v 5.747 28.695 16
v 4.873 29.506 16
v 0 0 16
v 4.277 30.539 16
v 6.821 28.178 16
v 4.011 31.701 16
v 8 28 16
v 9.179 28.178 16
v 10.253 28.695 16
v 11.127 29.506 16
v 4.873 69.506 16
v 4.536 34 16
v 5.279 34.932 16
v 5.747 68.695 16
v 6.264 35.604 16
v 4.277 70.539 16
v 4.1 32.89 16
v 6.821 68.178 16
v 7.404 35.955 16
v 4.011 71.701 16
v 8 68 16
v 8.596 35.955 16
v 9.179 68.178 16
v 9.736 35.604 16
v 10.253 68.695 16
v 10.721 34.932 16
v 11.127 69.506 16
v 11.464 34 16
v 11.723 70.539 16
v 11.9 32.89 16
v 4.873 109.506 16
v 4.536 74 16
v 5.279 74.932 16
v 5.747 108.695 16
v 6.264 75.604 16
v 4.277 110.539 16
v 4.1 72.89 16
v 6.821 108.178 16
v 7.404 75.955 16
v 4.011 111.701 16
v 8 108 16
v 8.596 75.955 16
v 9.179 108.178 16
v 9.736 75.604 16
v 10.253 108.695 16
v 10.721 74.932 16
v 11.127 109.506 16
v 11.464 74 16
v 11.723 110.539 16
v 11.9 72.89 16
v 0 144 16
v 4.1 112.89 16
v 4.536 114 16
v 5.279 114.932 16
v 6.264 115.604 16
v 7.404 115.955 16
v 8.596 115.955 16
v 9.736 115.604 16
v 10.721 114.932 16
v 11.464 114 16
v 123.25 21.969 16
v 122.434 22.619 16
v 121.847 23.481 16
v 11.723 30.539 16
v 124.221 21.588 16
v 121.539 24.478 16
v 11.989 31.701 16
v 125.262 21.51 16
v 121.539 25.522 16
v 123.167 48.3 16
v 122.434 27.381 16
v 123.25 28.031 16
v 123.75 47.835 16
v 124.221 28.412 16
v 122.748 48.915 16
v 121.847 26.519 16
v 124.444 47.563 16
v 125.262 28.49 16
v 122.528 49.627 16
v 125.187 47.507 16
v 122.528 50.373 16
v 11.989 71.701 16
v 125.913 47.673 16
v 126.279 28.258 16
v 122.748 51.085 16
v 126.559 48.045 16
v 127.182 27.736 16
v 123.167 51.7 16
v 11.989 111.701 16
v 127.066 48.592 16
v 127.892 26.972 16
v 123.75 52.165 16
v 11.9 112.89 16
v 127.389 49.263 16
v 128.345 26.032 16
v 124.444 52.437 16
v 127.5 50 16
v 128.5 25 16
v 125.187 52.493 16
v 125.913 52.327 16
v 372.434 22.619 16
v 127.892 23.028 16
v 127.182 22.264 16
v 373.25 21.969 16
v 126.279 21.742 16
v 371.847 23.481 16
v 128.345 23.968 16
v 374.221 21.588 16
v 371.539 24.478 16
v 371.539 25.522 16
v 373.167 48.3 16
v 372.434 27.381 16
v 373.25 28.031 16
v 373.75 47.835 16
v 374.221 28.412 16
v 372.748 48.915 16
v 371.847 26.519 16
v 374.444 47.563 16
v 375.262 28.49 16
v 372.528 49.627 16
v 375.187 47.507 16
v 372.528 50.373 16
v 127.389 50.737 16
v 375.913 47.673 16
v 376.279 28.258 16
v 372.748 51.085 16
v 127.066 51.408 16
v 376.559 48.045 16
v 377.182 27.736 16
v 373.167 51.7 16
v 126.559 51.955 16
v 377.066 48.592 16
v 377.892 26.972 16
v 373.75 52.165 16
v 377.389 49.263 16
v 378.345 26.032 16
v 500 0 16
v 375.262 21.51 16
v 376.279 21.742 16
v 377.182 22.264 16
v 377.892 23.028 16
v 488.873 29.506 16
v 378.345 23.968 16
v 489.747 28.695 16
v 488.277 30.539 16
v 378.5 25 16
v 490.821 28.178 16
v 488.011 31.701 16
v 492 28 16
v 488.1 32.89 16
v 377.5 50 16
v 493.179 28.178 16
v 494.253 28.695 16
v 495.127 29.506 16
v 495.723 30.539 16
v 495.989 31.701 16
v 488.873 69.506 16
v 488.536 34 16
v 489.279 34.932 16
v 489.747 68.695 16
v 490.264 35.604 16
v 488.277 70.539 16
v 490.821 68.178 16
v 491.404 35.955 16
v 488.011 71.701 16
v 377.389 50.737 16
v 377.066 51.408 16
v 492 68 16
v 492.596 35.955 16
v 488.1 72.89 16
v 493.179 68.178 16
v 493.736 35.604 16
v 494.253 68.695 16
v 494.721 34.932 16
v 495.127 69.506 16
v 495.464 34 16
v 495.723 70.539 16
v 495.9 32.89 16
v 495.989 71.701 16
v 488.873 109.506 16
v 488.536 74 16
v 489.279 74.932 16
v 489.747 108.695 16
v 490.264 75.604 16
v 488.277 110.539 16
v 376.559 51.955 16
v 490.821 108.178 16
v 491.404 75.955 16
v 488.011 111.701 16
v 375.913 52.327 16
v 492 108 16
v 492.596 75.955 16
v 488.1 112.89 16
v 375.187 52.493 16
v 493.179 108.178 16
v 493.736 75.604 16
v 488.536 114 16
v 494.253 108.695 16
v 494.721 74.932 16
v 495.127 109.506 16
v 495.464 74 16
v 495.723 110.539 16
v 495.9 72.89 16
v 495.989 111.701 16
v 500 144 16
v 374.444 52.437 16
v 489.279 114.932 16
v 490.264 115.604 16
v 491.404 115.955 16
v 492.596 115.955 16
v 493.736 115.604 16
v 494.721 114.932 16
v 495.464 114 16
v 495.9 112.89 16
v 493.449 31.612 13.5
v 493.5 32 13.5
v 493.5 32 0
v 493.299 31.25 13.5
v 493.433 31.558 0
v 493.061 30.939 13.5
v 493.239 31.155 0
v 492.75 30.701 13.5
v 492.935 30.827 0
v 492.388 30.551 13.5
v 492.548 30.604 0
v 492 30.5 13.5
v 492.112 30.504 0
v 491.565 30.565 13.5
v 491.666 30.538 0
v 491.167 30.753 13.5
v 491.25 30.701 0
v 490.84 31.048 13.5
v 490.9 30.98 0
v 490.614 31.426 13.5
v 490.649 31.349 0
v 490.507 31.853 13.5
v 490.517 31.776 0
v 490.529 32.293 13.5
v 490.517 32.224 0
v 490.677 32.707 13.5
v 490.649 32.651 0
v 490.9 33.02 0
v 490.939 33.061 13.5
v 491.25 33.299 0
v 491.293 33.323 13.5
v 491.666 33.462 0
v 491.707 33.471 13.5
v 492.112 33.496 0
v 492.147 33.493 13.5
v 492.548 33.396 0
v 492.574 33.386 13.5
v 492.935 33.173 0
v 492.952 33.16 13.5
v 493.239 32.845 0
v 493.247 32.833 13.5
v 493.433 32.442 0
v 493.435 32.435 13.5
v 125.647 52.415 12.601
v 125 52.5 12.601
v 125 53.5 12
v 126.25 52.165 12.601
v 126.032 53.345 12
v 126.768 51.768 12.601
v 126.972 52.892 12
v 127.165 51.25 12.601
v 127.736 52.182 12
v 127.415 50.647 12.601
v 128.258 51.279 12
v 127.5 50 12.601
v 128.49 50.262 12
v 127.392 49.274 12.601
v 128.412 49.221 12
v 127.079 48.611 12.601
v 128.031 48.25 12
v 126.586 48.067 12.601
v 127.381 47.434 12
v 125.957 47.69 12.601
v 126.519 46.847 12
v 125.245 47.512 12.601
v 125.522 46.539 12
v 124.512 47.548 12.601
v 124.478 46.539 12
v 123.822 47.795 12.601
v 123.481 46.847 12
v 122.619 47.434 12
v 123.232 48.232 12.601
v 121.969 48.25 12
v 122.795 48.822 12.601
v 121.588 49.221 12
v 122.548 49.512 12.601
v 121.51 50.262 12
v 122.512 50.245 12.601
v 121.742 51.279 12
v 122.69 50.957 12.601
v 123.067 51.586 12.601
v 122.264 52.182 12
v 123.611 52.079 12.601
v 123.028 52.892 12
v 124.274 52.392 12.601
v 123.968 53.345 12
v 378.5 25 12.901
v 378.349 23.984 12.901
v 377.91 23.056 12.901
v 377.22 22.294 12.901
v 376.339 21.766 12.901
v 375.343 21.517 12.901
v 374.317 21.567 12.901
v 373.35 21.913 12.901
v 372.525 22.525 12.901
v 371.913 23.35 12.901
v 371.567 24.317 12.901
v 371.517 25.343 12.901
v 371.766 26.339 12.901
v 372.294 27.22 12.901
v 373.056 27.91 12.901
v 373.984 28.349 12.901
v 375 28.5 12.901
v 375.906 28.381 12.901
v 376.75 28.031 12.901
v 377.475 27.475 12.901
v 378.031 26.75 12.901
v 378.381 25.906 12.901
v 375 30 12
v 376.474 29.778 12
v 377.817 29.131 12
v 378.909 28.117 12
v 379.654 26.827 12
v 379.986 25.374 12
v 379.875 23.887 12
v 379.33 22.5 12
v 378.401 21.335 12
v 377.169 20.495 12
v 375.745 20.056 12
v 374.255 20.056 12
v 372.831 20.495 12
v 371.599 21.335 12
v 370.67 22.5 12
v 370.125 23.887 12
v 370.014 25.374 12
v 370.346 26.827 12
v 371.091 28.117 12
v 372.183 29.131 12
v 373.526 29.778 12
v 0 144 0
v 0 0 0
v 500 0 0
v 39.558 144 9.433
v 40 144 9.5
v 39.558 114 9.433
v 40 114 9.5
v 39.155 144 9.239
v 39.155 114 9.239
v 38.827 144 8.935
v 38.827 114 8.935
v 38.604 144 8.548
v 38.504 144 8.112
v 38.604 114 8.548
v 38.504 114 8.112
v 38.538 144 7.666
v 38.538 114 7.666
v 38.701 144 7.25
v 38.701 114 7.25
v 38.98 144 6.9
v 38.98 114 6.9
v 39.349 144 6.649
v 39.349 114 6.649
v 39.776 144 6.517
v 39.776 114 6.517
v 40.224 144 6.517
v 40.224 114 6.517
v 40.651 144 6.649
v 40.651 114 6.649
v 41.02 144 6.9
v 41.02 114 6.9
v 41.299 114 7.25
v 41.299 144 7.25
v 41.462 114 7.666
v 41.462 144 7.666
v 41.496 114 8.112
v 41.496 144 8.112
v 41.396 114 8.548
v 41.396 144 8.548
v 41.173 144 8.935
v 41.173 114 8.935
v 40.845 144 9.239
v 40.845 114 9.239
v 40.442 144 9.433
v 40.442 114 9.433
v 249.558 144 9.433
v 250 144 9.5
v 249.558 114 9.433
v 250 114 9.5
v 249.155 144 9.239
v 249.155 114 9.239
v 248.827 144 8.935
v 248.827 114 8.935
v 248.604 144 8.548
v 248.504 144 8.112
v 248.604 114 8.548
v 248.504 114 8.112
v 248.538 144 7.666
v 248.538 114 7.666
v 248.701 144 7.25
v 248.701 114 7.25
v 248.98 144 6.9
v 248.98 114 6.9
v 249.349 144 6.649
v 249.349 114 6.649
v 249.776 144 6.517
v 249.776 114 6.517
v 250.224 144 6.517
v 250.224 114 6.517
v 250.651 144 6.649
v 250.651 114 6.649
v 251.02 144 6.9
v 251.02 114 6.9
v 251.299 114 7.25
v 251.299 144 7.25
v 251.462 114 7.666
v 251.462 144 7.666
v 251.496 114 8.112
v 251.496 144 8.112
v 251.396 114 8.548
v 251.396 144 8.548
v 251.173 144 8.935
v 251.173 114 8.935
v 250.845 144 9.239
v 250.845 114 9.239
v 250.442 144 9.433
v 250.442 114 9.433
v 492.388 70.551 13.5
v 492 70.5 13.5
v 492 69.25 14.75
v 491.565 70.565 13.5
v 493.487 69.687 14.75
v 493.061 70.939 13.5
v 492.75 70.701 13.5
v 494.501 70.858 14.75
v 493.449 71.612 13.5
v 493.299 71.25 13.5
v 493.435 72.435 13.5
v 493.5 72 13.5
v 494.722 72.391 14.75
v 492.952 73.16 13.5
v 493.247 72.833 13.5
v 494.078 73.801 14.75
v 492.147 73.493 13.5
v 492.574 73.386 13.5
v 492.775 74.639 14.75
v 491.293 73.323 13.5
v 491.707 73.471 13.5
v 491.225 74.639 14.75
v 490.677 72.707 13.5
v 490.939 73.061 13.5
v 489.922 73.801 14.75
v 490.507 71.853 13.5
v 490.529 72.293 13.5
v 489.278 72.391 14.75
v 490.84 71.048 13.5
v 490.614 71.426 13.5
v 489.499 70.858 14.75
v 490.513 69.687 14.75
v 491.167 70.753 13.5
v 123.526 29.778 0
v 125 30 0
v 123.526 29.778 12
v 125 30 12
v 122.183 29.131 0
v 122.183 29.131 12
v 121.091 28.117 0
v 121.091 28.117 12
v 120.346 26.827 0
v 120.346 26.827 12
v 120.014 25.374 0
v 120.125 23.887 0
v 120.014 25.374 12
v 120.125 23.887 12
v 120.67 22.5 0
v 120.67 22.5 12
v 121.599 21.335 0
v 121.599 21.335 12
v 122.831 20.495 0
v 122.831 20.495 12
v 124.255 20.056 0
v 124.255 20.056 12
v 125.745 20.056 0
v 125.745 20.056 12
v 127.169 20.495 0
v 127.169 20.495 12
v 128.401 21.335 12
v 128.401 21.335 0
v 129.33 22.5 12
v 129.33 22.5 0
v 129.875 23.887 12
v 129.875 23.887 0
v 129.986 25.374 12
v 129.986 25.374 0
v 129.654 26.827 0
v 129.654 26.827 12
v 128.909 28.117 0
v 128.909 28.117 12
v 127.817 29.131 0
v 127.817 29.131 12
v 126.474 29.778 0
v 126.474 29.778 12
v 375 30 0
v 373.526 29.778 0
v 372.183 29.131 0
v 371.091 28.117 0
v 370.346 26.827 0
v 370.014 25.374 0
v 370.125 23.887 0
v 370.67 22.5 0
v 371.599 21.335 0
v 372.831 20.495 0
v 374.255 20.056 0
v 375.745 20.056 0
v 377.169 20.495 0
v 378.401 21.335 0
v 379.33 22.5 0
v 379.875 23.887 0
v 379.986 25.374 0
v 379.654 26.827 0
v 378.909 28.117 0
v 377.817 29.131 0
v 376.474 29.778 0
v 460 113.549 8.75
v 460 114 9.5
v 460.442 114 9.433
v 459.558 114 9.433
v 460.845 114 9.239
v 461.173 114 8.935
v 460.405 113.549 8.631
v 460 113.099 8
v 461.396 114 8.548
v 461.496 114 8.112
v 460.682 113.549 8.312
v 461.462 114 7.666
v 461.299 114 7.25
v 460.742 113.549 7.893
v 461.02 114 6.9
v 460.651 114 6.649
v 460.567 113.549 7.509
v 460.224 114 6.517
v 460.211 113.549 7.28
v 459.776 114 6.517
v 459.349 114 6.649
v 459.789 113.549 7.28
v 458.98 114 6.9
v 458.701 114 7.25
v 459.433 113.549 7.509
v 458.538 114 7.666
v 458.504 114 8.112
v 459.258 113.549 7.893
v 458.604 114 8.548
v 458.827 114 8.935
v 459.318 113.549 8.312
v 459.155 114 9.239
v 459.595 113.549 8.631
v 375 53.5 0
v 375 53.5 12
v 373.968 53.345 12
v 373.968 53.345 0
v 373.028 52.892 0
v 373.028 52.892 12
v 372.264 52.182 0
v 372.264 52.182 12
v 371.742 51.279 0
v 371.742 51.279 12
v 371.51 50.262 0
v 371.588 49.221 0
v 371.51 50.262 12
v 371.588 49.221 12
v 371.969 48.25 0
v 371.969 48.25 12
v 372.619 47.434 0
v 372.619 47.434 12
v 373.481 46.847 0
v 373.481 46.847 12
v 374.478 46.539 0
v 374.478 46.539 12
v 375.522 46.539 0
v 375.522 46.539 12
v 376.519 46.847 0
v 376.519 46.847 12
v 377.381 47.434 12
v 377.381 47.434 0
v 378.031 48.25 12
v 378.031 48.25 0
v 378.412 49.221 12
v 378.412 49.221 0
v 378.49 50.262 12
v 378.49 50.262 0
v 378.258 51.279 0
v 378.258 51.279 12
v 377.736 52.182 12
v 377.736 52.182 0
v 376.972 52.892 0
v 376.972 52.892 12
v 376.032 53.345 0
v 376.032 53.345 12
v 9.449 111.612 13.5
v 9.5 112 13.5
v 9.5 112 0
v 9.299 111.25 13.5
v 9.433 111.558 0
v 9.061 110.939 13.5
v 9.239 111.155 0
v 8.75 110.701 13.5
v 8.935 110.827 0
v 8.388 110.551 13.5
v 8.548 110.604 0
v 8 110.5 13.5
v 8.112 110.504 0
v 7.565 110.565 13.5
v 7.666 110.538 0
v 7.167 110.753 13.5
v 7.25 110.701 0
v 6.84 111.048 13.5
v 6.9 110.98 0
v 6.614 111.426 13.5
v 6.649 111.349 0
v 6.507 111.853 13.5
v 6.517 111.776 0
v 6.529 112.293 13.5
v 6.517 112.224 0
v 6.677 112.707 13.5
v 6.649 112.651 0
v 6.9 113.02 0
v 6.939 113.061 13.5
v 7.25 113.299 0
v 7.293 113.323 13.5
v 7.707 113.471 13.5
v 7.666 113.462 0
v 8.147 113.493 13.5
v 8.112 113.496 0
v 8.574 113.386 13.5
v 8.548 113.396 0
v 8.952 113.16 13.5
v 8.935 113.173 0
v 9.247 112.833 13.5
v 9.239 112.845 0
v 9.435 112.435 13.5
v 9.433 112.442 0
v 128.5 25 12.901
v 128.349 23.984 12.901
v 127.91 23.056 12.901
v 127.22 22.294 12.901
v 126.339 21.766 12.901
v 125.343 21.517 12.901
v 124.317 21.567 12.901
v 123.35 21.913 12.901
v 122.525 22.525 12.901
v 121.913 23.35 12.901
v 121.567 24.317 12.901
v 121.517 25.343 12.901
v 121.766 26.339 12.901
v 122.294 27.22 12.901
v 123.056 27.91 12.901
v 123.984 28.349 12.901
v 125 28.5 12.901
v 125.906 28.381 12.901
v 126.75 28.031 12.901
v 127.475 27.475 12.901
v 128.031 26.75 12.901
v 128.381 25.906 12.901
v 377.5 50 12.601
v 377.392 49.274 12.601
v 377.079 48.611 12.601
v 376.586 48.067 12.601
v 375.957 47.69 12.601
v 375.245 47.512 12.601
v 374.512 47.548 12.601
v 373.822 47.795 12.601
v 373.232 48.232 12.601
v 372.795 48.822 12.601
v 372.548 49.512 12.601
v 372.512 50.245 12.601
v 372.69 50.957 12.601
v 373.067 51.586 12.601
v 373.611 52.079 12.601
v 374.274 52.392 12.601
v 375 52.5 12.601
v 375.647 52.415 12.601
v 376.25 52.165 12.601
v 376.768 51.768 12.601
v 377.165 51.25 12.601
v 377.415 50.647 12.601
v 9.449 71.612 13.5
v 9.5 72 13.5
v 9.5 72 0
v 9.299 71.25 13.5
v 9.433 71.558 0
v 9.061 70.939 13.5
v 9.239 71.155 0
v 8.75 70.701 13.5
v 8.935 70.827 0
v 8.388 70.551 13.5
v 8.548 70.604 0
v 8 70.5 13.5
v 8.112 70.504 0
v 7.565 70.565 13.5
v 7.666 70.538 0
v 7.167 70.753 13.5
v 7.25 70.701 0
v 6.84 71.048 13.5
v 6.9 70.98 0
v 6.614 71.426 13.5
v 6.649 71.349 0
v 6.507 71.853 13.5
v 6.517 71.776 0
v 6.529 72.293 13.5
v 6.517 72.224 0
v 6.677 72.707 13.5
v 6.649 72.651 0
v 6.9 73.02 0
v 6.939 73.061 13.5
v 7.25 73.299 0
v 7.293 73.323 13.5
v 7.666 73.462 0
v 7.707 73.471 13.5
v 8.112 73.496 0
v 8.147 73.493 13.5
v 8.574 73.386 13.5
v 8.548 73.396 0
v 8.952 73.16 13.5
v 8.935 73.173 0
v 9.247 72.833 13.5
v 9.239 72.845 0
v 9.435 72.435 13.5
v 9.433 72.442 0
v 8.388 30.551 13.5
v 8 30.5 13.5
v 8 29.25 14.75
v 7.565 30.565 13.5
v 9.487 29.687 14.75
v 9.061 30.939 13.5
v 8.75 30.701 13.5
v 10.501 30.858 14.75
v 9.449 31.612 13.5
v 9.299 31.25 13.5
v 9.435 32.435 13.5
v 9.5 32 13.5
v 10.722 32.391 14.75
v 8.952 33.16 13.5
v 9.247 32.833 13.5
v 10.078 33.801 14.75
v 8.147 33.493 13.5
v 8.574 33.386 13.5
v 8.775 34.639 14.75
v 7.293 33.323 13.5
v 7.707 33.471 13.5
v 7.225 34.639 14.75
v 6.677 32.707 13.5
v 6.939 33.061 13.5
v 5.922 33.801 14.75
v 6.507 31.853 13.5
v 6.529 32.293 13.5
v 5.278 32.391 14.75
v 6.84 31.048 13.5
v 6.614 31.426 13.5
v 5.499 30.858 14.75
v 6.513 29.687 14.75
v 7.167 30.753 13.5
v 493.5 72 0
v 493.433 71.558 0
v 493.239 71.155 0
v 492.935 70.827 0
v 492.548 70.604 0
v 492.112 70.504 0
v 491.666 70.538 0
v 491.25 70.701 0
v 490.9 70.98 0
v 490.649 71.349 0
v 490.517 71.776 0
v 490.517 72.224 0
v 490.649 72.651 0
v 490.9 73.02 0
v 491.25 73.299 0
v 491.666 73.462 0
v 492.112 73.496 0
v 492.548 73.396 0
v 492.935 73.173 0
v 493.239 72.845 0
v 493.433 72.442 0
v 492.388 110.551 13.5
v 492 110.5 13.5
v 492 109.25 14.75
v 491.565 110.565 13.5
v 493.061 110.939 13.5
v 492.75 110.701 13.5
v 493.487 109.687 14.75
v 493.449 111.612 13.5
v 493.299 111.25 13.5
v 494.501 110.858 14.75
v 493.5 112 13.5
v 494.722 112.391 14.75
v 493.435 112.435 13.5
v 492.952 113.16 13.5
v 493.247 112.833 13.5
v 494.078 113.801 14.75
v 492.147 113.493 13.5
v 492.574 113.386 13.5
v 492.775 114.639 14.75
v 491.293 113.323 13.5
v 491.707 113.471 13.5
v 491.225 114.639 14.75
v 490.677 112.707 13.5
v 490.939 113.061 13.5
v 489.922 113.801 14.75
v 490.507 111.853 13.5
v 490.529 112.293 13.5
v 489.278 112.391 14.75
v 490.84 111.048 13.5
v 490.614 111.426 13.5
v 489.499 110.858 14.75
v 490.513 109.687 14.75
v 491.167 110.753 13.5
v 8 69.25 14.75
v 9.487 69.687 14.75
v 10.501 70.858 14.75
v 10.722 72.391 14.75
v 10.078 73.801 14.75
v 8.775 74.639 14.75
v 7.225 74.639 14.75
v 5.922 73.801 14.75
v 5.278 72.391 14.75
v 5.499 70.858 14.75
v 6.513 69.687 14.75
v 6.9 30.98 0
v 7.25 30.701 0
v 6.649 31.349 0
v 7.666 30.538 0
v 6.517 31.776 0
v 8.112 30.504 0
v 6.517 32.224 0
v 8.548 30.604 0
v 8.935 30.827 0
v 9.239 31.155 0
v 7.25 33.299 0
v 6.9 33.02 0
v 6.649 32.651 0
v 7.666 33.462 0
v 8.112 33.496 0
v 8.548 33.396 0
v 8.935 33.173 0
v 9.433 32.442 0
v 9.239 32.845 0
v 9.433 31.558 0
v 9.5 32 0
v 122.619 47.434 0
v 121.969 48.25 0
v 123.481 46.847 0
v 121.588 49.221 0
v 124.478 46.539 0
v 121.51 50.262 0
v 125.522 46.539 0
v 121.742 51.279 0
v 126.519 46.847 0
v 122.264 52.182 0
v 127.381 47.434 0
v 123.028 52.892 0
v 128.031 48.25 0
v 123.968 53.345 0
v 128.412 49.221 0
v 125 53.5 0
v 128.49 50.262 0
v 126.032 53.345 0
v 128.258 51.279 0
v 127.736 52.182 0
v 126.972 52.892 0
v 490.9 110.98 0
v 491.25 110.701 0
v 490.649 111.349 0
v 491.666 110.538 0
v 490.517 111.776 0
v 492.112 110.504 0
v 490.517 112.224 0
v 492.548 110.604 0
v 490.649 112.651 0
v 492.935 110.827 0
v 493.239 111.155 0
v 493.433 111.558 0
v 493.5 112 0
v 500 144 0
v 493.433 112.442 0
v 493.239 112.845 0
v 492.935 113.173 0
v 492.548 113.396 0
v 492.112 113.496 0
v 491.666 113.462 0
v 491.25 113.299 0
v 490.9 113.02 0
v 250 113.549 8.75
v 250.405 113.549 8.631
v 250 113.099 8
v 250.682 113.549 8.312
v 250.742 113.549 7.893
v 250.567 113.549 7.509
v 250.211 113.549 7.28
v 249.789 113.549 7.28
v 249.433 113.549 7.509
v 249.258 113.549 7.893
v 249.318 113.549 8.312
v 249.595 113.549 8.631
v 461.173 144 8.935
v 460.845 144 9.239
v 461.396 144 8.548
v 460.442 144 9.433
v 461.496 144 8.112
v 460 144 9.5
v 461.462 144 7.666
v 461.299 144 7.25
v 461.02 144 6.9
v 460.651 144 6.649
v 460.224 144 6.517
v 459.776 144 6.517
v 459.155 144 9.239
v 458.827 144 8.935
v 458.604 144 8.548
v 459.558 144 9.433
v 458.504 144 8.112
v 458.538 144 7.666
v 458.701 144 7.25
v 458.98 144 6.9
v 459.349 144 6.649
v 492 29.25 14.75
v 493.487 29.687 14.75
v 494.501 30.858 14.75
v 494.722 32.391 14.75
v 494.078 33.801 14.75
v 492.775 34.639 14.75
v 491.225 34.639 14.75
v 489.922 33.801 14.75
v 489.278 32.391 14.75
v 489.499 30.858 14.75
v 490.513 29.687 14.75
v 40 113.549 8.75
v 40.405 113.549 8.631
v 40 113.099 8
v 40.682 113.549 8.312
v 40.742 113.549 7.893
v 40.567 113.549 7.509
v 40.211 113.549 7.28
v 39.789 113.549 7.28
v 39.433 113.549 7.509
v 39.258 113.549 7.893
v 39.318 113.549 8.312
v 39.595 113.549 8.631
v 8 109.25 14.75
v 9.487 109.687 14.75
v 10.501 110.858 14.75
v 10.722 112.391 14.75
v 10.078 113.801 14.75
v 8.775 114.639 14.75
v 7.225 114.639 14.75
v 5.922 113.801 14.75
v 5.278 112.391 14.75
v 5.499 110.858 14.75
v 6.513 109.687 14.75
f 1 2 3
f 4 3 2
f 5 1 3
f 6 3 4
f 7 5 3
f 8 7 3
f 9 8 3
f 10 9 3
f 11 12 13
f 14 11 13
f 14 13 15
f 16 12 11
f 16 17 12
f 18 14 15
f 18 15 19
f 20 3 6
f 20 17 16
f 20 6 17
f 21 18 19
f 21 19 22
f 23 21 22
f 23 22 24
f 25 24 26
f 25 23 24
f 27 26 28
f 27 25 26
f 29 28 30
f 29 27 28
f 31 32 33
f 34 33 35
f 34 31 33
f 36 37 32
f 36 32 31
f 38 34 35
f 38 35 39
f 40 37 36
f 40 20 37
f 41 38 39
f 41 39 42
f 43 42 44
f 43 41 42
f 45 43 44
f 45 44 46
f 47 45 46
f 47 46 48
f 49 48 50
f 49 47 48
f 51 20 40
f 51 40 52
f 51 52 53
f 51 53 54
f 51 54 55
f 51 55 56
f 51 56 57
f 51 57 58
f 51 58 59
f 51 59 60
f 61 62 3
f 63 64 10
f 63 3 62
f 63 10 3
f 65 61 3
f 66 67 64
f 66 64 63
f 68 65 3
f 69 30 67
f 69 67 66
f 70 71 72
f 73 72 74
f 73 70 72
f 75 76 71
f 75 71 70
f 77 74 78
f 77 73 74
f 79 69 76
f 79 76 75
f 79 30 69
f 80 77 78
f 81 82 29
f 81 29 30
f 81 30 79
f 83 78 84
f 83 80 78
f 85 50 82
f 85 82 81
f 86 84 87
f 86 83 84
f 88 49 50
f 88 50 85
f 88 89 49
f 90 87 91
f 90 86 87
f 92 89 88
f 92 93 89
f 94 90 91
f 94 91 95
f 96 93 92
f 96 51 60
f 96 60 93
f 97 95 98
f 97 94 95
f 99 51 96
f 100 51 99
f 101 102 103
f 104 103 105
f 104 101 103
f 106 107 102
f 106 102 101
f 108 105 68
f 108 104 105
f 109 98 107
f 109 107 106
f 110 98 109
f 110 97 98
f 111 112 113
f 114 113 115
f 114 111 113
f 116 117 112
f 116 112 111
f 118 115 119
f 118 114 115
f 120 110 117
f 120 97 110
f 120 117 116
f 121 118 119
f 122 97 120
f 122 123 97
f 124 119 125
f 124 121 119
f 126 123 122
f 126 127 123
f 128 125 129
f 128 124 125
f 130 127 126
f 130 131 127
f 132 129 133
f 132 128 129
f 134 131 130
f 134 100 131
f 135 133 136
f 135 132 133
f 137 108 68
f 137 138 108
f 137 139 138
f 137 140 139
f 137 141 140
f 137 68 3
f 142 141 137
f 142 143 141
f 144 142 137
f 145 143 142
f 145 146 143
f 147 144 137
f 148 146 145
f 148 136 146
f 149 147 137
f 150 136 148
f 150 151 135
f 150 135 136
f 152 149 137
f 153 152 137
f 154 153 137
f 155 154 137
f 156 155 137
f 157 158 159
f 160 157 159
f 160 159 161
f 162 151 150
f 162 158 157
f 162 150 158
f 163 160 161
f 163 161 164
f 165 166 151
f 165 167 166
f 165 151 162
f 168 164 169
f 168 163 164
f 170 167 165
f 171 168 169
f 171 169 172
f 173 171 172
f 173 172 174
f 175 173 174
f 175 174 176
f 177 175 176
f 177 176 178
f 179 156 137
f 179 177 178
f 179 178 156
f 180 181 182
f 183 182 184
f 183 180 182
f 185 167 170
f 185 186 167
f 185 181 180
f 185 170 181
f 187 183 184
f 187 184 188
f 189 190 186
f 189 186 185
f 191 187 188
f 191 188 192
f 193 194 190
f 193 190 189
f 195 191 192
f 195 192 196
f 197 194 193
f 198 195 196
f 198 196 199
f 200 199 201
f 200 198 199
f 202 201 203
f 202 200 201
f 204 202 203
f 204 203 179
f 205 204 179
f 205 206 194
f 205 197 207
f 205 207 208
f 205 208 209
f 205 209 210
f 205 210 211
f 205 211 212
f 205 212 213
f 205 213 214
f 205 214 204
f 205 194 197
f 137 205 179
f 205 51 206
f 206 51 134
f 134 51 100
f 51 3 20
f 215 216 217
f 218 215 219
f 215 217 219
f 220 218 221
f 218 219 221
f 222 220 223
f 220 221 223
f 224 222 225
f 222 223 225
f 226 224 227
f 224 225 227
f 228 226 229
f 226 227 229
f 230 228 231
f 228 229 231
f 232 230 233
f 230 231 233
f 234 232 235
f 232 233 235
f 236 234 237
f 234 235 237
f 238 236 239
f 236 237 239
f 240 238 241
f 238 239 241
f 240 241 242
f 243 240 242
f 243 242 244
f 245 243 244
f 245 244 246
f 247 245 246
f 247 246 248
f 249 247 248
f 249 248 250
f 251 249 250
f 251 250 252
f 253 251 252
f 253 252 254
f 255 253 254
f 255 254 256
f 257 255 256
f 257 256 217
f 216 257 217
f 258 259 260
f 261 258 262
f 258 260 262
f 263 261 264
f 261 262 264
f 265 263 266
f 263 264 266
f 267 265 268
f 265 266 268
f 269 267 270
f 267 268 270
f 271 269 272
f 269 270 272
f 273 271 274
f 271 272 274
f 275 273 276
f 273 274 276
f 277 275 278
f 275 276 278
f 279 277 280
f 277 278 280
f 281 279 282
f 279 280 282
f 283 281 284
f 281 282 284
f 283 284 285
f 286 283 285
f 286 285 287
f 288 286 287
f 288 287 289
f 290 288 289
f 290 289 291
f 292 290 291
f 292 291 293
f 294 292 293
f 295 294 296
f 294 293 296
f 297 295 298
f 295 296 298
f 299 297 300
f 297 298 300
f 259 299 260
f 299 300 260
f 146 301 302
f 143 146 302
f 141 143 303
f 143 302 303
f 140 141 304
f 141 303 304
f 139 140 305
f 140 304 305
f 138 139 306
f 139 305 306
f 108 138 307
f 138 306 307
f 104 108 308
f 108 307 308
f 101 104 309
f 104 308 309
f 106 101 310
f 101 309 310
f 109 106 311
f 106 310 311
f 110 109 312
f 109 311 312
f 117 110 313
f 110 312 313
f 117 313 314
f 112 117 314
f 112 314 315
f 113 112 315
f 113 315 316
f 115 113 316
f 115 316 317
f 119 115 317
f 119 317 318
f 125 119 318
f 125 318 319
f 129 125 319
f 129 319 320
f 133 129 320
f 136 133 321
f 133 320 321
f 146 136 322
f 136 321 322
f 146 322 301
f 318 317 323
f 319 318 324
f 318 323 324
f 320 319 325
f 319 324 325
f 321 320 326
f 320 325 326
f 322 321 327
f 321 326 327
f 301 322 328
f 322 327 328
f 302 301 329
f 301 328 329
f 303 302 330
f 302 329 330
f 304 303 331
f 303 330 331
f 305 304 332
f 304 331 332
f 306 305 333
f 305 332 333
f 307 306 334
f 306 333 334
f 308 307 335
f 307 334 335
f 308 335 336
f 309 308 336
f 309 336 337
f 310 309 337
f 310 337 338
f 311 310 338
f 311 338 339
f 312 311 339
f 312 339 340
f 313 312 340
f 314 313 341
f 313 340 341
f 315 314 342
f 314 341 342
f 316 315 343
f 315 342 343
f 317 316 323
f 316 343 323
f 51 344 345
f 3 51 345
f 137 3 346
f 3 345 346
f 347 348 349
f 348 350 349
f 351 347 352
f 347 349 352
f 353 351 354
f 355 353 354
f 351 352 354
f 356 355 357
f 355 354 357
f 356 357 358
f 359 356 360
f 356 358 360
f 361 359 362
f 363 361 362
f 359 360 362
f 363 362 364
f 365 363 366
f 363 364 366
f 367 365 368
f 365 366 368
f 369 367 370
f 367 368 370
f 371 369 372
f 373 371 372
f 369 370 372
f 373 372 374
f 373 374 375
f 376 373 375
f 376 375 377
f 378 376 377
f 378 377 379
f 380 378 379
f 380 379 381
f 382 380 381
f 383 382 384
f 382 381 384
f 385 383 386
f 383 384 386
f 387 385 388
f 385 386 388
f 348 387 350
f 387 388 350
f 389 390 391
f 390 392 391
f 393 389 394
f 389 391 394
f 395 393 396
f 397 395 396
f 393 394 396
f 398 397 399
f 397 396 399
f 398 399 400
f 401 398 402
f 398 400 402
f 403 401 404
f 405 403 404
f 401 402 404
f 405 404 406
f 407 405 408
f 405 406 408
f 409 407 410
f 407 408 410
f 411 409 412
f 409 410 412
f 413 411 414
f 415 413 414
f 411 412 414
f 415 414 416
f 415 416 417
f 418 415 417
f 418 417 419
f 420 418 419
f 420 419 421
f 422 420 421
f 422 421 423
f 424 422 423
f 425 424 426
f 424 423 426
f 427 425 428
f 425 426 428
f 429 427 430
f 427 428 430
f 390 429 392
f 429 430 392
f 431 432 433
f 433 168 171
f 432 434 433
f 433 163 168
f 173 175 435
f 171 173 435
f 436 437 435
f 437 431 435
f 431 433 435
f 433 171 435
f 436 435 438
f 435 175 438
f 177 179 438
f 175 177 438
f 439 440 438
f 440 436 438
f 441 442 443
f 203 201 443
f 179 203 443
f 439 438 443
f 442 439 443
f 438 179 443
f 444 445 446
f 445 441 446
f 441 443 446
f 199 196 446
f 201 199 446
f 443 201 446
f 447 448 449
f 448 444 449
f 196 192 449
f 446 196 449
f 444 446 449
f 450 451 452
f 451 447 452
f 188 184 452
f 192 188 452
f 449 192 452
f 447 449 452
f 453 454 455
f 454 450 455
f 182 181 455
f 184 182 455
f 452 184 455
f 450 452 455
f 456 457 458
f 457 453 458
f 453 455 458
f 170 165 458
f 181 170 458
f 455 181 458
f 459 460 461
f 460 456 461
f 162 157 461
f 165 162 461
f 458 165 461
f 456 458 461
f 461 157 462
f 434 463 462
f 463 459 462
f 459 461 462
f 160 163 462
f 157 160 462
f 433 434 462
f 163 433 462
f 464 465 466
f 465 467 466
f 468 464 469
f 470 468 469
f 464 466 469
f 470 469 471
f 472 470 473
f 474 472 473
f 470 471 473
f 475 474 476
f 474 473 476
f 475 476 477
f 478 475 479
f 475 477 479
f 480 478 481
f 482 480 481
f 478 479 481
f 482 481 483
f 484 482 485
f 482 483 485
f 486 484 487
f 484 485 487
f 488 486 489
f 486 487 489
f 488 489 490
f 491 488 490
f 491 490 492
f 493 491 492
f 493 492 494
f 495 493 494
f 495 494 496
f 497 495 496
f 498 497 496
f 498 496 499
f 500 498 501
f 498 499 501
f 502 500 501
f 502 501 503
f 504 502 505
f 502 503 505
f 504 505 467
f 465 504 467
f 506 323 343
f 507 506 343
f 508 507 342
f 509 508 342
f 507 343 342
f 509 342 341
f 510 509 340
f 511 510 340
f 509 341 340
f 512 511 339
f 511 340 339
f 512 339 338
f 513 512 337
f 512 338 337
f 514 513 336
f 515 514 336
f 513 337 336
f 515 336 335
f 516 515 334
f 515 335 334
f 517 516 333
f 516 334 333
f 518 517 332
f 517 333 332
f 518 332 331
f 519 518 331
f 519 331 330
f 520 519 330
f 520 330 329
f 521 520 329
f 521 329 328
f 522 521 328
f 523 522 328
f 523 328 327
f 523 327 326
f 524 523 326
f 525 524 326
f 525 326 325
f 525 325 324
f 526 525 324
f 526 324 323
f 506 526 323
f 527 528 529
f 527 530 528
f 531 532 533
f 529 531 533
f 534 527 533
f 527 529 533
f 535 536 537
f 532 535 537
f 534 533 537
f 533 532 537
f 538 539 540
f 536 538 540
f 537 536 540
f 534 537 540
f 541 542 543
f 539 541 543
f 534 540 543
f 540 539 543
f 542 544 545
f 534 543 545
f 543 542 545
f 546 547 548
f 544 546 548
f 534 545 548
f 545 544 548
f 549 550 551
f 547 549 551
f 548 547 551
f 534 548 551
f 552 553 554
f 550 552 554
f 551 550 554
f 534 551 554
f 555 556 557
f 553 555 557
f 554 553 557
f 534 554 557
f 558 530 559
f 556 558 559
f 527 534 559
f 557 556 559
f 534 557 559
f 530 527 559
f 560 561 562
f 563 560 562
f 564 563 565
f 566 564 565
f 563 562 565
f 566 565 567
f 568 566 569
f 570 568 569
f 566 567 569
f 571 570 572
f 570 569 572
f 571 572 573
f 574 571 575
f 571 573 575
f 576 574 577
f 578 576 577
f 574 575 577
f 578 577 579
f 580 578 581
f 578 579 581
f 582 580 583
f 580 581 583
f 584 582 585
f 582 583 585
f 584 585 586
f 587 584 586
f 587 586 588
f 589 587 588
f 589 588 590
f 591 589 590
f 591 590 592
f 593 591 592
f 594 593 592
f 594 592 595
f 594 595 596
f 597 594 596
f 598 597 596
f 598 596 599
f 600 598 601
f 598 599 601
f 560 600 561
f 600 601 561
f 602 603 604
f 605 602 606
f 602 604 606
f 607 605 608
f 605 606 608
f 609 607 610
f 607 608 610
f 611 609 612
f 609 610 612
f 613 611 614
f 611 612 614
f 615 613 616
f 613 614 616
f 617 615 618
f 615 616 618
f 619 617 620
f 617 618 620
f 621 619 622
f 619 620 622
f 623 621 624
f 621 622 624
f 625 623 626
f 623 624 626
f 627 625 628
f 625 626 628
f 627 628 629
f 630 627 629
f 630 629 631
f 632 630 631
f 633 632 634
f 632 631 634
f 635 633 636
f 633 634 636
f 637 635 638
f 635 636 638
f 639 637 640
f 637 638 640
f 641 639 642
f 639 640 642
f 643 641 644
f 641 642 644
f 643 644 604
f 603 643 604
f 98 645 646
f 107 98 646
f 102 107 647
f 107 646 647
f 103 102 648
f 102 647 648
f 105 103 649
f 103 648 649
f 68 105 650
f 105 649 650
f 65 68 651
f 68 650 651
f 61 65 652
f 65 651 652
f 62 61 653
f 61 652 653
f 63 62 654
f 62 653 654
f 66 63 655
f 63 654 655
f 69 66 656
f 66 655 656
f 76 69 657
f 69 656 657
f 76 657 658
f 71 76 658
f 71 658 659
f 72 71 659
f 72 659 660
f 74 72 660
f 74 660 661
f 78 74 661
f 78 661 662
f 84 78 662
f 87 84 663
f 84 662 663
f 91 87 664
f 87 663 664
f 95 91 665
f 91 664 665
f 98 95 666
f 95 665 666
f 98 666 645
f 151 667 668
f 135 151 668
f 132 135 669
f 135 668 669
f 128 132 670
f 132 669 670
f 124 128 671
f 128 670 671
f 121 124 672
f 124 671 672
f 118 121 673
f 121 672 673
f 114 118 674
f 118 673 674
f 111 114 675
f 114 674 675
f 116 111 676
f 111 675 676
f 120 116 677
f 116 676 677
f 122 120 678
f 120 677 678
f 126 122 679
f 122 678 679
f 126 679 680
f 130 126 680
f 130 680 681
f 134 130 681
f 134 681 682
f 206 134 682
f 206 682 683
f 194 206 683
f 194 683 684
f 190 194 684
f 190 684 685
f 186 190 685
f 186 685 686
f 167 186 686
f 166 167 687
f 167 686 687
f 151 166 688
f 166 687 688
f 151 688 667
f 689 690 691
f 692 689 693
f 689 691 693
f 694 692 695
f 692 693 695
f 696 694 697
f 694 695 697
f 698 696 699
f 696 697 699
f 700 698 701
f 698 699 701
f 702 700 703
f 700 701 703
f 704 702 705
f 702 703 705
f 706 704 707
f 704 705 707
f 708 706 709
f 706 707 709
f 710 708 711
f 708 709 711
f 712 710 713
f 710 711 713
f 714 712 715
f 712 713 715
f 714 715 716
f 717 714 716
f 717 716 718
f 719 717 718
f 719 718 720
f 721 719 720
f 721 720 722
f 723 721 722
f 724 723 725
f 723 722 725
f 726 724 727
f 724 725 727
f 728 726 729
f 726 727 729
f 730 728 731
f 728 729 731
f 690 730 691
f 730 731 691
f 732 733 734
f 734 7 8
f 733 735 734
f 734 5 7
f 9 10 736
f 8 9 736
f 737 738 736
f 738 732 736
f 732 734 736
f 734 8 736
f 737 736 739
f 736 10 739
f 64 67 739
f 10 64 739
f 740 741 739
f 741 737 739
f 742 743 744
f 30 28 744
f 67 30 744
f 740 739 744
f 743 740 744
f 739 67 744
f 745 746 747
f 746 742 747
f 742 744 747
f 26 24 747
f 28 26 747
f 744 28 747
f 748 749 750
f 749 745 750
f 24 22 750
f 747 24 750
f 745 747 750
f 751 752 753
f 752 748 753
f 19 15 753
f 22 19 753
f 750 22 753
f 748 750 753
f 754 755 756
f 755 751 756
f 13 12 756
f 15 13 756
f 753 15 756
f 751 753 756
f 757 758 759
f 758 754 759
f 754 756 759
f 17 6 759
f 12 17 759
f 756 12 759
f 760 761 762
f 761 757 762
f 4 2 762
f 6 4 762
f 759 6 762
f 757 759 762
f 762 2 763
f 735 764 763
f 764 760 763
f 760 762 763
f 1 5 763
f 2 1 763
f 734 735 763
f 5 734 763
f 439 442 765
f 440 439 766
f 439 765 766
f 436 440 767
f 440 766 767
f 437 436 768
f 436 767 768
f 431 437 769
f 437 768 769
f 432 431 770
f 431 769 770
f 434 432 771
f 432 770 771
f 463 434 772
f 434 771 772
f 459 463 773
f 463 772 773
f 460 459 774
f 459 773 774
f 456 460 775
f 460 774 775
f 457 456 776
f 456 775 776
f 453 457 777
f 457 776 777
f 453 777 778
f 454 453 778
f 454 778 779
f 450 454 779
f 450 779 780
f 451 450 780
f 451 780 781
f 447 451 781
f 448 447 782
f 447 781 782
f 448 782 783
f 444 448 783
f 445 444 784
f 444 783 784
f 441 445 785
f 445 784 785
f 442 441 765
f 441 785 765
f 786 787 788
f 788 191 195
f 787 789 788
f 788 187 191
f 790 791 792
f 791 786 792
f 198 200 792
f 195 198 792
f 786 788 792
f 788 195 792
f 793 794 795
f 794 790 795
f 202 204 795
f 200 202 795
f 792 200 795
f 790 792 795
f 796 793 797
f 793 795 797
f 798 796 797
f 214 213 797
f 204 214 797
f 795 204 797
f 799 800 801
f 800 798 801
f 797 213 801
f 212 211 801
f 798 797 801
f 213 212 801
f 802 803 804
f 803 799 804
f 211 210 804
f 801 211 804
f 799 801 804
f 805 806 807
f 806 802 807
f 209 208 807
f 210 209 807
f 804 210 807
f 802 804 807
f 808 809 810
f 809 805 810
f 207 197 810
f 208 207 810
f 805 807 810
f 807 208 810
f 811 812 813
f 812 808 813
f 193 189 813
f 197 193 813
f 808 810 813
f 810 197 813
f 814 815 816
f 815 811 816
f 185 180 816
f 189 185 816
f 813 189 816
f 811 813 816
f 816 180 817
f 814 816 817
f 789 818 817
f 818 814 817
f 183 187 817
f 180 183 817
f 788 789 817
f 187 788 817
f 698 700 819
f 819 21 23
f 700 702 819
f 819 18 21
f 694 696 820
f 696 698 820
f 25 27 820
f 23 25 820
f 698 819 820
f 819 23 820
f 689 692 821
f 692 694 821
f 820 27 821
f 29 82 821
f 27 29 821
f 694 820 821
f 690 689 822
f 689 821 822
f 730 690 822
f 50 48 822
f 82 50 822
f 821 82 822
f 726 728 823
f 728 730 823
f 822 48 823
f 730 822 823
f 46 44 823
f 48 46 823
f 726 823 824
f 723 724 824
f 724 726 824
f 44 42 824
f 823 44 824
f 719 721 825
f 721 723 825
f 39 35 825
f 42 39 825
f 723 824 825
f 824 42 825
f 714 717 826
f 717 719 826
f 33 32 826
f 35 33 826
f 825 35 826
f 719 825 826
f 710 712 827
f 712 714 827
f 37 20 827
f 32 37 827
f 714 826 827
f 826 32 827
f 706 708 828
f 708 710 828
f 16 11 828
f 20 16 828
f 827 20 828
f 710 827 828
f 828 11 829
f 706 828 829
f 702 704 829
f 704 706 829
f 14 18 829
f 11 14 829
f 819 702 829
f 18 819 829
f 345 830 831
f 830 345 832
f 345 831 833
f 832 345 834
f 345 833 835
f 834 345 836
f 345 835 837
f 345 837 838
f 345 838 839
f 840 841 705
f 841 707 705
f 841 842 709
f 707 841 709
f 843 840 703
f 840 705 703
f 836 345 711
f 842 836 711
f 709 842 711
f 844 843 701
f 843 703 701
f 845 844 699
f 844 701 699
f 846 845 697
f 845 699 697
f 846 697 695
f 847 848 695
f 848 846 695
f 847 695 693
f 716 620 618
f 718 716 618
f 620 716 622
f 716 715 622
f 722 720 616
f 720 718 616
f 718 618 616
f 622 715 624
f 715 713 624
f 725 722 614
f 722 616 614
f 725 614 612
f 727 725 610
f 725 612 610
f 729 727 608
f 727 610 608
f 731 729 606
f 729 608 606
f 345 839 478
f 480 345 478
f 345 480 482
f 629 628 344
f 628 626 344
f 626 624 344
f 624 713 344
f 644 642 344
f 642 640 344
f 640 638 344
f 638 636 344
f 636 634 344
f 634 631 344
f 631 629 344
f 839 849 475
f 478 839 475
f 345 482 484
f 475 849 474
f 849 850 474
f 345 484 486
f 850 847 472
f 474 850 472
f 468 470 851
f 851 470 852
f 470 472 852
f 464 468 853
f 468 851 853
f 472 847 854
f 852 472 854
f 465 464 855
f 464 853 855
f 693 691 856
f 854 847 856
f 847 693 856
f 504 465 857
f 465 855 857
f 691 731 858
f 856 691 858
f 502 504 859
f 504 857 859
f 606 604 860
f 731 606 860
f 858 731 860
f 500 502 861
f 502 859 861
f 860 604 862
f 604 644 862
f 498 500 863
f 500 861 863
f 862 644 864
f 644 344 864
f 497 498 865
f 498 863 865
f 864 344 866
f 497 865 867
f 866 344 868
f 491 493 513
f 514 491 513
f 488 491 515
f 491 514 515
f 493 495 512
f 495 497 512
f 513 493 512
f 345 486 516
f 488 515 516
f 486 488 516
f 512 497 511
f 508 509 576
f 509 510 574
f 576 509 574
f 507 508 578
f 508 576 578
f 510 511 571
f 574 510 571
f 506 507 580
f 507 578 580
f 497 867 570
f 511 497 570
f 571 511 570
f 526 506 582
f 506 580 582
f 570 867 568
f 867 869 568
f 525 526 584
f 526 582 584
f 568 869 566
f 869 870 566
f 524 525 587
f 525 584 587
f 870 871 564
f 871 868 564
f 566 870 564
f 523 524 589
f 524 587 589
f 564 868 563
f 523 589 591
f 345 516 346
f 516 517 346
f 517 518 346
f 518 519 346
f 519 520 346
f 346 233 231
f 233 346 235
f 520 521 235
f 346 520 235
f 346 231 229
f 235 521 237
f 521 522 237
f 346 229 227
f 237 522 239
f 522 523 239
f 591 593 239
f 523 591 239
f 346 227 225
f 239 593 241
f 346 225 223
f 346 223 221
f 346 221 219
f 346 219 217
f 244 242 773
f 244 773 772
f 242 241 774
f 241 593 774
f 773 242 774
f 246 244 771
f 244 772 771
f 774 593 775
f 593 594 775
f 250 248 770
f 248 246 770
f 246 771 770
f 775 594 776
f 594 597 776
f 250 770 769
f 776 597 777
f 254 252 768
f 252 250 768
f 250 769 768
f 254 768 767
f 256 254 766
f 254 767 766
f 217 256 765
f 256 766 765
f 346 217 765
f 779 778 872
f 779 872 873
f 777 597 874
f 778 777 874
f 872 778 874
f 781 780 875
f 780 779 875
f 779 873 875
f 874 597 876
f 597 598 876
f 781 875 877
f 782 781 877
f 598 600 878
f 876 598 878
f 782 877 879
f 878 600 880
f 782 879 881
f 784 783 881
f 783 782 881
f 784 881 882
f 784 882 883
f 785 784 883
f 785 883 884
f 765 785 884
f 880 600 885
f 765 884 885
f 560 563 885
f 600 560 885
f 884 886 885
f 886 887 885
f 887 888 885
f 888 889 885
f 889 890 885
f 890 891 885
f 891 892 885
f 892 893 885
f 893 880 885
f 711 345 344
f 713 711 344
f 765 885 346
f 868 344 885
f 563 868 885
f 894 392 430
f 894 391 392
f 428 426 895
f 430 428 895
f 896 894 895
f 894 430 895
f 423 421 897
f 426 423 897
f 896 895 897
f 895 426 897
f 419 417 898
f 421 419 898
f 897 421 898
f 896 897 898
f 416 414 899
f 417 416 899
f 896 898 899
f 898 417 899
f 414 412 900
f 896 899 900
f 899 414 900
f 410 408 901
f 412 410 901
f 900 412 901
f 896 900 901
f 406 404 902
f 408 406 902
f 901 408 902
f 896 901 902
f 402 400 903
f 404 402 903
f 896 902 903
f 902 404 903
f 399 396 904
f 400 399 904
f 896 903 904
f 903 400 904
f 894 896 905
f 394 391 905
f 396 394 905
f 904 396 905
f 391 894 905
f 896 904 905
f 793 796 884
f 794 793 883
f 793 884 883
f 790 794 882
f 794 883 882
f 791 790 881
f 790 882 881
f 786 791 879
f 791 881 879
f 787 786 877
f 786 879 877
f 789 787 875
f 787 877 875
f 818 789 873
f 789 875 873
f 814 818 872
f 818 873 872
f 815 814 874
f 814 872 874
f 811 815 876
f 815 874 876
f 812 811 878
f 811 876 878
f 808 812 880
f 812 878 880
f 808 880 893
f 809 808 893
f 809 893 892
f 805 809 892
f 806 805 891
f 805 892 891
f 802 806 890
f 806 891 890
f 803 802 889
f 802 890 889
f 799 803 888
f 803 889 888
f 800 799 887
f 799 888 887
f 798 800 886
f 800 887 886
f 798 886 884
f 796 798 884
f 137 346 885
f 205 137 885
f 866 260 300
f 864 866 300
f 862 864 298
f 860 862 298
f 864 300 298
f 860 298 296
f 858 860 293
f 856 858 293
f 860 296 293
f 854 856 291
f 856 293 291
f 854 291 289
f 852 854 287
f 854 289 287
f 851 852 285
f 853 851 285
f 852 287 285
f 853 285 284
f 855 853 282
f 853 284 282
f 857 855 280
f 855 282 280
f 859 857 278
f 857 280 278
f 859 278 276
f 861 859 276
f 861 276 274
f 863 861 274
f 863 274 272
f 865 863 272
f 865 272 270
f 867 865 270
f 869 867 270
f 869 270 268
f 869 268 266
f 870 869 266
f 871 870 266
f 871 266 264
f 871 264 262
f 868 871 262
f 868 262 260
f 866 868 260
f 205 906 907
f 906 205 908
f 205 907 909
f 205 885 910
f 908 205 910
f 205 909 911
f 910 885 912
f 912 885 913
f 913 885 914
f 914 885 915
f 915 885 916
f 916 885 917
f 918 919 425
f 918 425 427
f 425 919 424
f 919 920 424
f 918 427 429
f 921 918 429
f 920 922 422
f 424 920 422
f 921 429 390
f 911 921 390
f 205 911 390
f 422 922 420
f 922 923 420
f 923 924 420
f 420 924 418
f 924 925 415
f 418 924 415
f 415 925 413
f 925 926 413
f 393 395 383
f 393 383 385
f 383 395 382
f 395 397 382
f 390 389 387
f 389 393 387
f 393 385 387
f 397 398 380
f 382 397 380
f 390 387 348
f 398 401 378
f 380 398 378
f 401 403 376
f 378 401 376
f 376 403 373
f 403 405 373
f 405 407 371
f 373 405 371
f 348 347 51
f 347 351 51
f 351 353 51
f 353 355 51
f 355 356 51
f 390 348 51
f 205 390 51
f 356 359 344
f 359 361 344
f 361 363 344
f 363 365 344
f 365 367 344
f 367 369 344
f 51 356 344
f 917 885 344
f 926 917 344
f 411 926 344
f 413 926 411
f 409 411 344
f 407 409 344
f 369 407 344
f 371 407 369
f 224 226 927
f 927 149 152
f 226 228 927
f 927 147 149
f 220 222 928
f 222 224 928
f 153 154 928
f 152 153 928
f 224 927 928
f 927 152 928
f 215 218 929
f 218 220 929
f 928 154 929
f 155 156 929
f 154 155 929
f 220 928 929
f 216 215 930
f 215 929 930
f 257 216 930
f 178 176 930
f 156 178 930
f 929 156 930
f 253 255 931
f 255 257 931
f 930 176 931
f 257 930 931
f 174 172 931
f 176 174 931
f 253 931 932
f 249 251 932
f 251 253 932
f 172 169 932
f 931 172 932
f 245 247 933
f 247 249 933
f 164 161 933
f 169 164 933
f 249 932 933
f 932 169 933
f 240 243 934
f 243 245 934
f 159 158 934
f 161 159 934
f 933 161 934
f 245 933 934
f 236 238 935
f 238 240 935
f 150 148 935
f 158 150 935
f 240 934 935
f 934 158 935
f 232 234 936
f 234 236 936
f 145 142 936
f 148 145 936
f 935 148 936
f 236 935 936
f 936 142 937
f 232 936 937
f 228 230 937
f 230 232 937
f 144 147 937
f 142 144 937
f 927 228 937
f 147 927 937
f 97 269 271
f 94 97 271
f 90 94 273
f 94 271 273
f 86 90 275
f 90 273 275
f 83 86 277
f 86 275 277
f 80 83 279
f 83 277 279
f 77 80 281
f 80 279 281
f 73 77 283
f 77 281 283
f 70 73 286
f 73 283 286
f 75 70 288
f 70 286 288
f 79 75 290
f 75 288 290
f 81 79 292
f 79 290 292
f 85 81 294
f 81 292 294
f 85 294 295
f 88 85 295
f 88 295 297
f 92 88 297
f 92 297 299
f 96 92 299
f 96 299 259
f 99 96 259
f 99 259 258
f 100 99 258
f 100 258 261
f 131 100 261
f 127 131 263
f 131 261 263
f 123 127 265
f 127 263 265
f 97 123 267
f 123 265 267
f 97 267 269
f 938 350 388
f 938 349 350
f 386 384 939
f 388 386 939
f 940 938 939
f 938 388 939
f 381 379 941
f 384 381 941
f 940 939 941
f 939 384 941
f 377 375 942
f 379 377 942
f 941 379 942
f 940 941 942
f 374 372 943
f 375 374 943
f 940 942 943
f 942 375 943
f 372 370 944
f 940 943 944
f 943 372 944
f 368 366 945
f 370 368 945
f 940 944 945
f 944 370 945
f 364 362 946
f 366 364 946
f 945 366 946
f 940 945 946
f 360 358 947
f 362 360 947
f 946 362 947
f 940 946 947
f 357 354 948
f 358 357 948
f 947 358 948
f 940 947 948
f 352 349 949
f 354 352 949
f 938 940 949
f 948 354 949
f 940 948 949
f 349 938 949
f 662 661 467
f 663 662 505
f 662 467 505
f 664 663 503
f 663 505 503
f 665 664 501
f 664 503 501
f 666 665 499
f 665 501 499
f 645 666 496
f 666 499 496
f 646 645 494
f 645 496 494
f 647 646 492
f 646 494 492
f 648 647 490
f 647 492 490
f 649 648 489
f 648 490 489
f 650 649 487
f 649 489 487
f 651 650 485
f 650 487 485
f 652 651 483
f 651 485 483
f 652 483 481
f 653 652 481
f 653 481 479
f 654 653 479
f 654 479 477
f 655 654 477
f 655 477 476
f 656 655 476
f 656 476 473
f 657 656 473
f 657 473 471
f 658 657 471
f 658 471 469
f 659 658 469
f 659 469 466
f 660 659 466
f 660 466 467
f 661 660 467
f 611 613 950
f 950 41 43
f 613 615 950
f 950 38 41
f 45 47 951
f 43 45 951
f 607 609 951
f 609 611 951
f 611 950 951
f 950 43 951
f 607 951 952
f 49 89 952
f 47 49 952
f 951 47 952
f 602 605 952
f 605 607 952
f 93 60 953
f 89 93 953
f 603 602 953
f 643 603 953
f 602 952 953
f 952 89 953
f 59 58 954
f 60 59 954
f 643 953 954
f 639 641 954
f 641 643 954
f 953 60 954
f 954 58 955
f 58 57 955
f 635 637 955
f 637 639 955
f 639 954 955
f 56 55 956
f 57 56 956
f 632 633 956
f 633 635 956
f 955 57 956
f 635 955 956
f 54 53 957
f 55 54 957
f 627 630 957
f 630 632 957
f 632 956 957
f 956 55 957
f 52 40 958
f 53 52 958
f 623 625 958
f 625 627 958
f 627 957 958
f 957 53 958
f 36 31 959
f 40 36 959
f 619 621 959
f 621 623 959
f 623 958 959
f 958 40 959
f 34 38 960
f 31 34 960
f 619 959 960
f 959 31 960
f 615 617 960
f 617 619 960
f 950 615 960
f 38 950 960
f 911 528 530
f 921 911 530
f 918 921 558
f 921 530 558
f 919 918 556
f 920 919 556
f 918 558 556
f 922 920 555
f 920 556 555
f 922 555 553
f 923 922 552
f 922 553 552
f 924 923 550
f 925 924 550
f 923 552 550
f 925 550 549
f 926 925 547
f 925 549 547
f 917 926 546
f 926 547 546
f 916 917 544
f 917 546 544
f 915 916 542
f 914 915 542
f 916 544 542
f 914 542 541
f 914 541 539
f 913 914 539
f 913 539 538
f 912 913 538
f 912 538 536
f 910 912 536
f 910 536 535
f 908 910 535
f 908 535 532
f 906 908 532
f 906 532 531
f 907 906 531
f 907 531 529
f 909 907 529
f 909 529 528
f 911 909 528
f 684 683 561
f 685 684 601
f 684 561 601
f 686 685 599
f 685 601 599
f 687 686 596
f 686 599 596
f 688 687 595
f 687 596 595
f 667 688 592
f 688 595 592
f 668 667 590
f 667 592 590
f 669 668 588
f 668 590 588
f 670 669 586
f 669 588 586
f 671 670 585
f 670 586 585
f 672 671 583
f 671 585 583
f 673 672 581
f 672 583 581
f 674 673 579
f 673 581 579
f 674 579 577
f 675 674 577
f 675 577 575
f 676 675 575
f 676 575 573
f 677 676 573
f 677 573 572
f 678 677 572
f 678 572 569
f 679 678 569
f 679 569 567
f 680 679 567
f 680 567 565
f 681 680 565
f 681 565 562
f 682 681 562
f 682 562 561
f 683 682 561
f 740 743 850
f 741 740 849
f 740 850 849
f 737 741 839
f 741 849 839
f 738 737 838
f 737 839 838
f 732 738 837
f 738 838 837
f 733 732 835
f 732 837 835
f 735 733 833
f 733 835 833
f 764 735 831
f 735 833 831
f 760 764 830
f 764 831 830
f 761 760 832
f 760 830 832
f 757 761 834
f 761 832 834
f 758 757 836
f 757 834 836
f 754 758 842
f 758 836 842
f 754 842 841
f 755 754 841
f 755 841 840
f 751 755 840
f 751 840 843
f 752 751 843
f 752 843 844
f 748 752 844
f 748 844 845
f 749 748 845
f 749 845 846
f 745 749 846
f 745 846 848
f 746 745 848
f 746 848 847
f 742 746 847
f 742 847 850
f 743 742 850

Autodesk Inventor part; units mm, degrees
ref_plane "YZ Plane" through (0, 0, 0) normal (1, 0, 0) x (0, 1, 0)
ref_plane "XZ Plane" through (0, 0, 0) normal (0, 1, 0) x (-1, 0, 0)
ref_plane "XY Plane" through (0, 0, 0) normal (0, 0, 1) x (1, 0, 0)
sketch "Skizze1" plane through (0, 0, 0) normal (0, 0, 1) x (1, 0, 0)
  line L0 (0, 0) -> (500, 0)
  line L1 (500, 0) -> (500, 144)
  line L2 (500, 144) -> (0, 144)
  line L3 (0, 144) -> (0, 0)
  line L4 (0, 25) -> (500, 25) construction
  line L5 (0, 50) -> (500, 50) construction
  line L6 (250, 0) -> (250, 144) construction
  line L7 (125, 0) -> (125, 144) construction
  line L8 (375, 144) -> (375, 0) construction
  circle A0 centre (125, 50) radius 2.5
  circle A1 centre (375, 50) radius 2.5
  circle A2 centre (375, 25) radius 3.5
  circle A3 centre (125, 25) radius 3.5
  line L9 (492, 144) -> (492, 0) construction
  line L10 (500, 112) -> (0, 112) construction
  line L11 (500, 32) -> (0, 32) construction
  circle A4 centre (492, 112) radius 1.5
  circle A5 centre (492, 32) radius 1.5
  line L12 (8, 144) -> (8, 0) construction
  circle A6 centre (8, 112) radius 1.5
  circle A7 centre (8, 72) radius 1.5
  circle A8 centre (8, 32) radius 1.5
  circle A9 centre (492, 72) radius 1.5
  point P0 (-875, 50)
  point P1 (-875, 25)
  point P2 (500, 72)
  dimension "d0" = 500
  dimension "d1" = 144
  dimension "d2" = 25
  dimension "d3" = 50
  dimension "d4" = 125
  dimension "d5" = 125
  dimension "d9" = 5
  dimension "d10" = 5
  dimension "d13" = 7
  dimension "d14" = 7
  dimension "d20" = 8
  dimension "d21" = 40
  dimension "d22" = 40
  dimension "d23" = 3
  dimension "d24" = 3
  dimension "d25" = 8
  dimension "d26" = 3
  dimension "d27" = 3
  dimension "d28" = 3
  dimension "d29" = 3
extrude "Extrusion1" add sketch "Skizze1" along normal blind 16
hole "Bohrung1" at (375, 25, 0) at (125, 25, 0) at (-875, 25, 0) direction (0, 0, 1) diameter 10 depth 12 tip angle 118
hole "Bohrung4" at (375, 50, 0) at (125, 50, 0) direction (0, 0, 1) diameter 7 depth 12 tip angle 118
sketch "Skizze2" plane through (0, 0, 16) normal (0, 0, 1) x (1, 0, 0)
  circle A0 centre (250, 72) radius 1.5 projected
  circle A1 centre (492, 112) radius 1.5 projected
  circle A2 centre (492, 72) radius 1.5 projected
  circle A3 centre (492, 32) radius 1.5 projected
  circle A4 centre (8, 72) radius 1.5 projected
  circle A5 centre (8, 112) radius 1.5 projected
  circle A6 centre (8, 32) radius 1.5 projected
  circle A7 centre (250, 32) radius 1.5 projected
  circle A8 centre (250, 112) radius 1.5 projected
  point P0 (0, 0)
hole "Bohrung7" at (492, 112, 16) at (492, 72, 16) at (492, 32, 16) at (8, 72, 16) at (8, 32, 16) at (8, 112, 16) direction (0, 0, -1) diameter 3 depth 8 countersink diameter 8 countersink angle 90
sketch "Skizze3" plane through (0, 144, 0) normal (0, 1, 0) x (1, 0, 0)
  line L0 (500, -16) -> (0, -16) construction
  line L1 (0, -16) -> (0, 0) construction
  line L2 (0, 0) -> (500, 0) construction
  line L3 (500, 0) -> (500, -16) construction
  line L4 (500, -8) -> (0, -8) construction
  line L5 (0, 0) -> (0, -16) construction
  line L6 (0, -16) -> (500, -16) construction
  line L7 (460, -16) -> (460, 0) construction
  line L8 (0, 0) -> (500, 0) construction
  line L9 (40, -16) -> (40, 0) construction
  line L10 (250, -16) -> (250, 0) construction
  point P0 (460, -8)
  point P1 (250, -8)
  point P2 (40, -8)
  dimension "d120" = 40
  dimension "d121" = 40
hole "Bohrung12" at (460, 144, 8) at (250, 144, 8) at (40, 144, 8) direction (0, -1, 0) diameter 3 depth 30 tip angle 118
properties part number "licht_2m"
